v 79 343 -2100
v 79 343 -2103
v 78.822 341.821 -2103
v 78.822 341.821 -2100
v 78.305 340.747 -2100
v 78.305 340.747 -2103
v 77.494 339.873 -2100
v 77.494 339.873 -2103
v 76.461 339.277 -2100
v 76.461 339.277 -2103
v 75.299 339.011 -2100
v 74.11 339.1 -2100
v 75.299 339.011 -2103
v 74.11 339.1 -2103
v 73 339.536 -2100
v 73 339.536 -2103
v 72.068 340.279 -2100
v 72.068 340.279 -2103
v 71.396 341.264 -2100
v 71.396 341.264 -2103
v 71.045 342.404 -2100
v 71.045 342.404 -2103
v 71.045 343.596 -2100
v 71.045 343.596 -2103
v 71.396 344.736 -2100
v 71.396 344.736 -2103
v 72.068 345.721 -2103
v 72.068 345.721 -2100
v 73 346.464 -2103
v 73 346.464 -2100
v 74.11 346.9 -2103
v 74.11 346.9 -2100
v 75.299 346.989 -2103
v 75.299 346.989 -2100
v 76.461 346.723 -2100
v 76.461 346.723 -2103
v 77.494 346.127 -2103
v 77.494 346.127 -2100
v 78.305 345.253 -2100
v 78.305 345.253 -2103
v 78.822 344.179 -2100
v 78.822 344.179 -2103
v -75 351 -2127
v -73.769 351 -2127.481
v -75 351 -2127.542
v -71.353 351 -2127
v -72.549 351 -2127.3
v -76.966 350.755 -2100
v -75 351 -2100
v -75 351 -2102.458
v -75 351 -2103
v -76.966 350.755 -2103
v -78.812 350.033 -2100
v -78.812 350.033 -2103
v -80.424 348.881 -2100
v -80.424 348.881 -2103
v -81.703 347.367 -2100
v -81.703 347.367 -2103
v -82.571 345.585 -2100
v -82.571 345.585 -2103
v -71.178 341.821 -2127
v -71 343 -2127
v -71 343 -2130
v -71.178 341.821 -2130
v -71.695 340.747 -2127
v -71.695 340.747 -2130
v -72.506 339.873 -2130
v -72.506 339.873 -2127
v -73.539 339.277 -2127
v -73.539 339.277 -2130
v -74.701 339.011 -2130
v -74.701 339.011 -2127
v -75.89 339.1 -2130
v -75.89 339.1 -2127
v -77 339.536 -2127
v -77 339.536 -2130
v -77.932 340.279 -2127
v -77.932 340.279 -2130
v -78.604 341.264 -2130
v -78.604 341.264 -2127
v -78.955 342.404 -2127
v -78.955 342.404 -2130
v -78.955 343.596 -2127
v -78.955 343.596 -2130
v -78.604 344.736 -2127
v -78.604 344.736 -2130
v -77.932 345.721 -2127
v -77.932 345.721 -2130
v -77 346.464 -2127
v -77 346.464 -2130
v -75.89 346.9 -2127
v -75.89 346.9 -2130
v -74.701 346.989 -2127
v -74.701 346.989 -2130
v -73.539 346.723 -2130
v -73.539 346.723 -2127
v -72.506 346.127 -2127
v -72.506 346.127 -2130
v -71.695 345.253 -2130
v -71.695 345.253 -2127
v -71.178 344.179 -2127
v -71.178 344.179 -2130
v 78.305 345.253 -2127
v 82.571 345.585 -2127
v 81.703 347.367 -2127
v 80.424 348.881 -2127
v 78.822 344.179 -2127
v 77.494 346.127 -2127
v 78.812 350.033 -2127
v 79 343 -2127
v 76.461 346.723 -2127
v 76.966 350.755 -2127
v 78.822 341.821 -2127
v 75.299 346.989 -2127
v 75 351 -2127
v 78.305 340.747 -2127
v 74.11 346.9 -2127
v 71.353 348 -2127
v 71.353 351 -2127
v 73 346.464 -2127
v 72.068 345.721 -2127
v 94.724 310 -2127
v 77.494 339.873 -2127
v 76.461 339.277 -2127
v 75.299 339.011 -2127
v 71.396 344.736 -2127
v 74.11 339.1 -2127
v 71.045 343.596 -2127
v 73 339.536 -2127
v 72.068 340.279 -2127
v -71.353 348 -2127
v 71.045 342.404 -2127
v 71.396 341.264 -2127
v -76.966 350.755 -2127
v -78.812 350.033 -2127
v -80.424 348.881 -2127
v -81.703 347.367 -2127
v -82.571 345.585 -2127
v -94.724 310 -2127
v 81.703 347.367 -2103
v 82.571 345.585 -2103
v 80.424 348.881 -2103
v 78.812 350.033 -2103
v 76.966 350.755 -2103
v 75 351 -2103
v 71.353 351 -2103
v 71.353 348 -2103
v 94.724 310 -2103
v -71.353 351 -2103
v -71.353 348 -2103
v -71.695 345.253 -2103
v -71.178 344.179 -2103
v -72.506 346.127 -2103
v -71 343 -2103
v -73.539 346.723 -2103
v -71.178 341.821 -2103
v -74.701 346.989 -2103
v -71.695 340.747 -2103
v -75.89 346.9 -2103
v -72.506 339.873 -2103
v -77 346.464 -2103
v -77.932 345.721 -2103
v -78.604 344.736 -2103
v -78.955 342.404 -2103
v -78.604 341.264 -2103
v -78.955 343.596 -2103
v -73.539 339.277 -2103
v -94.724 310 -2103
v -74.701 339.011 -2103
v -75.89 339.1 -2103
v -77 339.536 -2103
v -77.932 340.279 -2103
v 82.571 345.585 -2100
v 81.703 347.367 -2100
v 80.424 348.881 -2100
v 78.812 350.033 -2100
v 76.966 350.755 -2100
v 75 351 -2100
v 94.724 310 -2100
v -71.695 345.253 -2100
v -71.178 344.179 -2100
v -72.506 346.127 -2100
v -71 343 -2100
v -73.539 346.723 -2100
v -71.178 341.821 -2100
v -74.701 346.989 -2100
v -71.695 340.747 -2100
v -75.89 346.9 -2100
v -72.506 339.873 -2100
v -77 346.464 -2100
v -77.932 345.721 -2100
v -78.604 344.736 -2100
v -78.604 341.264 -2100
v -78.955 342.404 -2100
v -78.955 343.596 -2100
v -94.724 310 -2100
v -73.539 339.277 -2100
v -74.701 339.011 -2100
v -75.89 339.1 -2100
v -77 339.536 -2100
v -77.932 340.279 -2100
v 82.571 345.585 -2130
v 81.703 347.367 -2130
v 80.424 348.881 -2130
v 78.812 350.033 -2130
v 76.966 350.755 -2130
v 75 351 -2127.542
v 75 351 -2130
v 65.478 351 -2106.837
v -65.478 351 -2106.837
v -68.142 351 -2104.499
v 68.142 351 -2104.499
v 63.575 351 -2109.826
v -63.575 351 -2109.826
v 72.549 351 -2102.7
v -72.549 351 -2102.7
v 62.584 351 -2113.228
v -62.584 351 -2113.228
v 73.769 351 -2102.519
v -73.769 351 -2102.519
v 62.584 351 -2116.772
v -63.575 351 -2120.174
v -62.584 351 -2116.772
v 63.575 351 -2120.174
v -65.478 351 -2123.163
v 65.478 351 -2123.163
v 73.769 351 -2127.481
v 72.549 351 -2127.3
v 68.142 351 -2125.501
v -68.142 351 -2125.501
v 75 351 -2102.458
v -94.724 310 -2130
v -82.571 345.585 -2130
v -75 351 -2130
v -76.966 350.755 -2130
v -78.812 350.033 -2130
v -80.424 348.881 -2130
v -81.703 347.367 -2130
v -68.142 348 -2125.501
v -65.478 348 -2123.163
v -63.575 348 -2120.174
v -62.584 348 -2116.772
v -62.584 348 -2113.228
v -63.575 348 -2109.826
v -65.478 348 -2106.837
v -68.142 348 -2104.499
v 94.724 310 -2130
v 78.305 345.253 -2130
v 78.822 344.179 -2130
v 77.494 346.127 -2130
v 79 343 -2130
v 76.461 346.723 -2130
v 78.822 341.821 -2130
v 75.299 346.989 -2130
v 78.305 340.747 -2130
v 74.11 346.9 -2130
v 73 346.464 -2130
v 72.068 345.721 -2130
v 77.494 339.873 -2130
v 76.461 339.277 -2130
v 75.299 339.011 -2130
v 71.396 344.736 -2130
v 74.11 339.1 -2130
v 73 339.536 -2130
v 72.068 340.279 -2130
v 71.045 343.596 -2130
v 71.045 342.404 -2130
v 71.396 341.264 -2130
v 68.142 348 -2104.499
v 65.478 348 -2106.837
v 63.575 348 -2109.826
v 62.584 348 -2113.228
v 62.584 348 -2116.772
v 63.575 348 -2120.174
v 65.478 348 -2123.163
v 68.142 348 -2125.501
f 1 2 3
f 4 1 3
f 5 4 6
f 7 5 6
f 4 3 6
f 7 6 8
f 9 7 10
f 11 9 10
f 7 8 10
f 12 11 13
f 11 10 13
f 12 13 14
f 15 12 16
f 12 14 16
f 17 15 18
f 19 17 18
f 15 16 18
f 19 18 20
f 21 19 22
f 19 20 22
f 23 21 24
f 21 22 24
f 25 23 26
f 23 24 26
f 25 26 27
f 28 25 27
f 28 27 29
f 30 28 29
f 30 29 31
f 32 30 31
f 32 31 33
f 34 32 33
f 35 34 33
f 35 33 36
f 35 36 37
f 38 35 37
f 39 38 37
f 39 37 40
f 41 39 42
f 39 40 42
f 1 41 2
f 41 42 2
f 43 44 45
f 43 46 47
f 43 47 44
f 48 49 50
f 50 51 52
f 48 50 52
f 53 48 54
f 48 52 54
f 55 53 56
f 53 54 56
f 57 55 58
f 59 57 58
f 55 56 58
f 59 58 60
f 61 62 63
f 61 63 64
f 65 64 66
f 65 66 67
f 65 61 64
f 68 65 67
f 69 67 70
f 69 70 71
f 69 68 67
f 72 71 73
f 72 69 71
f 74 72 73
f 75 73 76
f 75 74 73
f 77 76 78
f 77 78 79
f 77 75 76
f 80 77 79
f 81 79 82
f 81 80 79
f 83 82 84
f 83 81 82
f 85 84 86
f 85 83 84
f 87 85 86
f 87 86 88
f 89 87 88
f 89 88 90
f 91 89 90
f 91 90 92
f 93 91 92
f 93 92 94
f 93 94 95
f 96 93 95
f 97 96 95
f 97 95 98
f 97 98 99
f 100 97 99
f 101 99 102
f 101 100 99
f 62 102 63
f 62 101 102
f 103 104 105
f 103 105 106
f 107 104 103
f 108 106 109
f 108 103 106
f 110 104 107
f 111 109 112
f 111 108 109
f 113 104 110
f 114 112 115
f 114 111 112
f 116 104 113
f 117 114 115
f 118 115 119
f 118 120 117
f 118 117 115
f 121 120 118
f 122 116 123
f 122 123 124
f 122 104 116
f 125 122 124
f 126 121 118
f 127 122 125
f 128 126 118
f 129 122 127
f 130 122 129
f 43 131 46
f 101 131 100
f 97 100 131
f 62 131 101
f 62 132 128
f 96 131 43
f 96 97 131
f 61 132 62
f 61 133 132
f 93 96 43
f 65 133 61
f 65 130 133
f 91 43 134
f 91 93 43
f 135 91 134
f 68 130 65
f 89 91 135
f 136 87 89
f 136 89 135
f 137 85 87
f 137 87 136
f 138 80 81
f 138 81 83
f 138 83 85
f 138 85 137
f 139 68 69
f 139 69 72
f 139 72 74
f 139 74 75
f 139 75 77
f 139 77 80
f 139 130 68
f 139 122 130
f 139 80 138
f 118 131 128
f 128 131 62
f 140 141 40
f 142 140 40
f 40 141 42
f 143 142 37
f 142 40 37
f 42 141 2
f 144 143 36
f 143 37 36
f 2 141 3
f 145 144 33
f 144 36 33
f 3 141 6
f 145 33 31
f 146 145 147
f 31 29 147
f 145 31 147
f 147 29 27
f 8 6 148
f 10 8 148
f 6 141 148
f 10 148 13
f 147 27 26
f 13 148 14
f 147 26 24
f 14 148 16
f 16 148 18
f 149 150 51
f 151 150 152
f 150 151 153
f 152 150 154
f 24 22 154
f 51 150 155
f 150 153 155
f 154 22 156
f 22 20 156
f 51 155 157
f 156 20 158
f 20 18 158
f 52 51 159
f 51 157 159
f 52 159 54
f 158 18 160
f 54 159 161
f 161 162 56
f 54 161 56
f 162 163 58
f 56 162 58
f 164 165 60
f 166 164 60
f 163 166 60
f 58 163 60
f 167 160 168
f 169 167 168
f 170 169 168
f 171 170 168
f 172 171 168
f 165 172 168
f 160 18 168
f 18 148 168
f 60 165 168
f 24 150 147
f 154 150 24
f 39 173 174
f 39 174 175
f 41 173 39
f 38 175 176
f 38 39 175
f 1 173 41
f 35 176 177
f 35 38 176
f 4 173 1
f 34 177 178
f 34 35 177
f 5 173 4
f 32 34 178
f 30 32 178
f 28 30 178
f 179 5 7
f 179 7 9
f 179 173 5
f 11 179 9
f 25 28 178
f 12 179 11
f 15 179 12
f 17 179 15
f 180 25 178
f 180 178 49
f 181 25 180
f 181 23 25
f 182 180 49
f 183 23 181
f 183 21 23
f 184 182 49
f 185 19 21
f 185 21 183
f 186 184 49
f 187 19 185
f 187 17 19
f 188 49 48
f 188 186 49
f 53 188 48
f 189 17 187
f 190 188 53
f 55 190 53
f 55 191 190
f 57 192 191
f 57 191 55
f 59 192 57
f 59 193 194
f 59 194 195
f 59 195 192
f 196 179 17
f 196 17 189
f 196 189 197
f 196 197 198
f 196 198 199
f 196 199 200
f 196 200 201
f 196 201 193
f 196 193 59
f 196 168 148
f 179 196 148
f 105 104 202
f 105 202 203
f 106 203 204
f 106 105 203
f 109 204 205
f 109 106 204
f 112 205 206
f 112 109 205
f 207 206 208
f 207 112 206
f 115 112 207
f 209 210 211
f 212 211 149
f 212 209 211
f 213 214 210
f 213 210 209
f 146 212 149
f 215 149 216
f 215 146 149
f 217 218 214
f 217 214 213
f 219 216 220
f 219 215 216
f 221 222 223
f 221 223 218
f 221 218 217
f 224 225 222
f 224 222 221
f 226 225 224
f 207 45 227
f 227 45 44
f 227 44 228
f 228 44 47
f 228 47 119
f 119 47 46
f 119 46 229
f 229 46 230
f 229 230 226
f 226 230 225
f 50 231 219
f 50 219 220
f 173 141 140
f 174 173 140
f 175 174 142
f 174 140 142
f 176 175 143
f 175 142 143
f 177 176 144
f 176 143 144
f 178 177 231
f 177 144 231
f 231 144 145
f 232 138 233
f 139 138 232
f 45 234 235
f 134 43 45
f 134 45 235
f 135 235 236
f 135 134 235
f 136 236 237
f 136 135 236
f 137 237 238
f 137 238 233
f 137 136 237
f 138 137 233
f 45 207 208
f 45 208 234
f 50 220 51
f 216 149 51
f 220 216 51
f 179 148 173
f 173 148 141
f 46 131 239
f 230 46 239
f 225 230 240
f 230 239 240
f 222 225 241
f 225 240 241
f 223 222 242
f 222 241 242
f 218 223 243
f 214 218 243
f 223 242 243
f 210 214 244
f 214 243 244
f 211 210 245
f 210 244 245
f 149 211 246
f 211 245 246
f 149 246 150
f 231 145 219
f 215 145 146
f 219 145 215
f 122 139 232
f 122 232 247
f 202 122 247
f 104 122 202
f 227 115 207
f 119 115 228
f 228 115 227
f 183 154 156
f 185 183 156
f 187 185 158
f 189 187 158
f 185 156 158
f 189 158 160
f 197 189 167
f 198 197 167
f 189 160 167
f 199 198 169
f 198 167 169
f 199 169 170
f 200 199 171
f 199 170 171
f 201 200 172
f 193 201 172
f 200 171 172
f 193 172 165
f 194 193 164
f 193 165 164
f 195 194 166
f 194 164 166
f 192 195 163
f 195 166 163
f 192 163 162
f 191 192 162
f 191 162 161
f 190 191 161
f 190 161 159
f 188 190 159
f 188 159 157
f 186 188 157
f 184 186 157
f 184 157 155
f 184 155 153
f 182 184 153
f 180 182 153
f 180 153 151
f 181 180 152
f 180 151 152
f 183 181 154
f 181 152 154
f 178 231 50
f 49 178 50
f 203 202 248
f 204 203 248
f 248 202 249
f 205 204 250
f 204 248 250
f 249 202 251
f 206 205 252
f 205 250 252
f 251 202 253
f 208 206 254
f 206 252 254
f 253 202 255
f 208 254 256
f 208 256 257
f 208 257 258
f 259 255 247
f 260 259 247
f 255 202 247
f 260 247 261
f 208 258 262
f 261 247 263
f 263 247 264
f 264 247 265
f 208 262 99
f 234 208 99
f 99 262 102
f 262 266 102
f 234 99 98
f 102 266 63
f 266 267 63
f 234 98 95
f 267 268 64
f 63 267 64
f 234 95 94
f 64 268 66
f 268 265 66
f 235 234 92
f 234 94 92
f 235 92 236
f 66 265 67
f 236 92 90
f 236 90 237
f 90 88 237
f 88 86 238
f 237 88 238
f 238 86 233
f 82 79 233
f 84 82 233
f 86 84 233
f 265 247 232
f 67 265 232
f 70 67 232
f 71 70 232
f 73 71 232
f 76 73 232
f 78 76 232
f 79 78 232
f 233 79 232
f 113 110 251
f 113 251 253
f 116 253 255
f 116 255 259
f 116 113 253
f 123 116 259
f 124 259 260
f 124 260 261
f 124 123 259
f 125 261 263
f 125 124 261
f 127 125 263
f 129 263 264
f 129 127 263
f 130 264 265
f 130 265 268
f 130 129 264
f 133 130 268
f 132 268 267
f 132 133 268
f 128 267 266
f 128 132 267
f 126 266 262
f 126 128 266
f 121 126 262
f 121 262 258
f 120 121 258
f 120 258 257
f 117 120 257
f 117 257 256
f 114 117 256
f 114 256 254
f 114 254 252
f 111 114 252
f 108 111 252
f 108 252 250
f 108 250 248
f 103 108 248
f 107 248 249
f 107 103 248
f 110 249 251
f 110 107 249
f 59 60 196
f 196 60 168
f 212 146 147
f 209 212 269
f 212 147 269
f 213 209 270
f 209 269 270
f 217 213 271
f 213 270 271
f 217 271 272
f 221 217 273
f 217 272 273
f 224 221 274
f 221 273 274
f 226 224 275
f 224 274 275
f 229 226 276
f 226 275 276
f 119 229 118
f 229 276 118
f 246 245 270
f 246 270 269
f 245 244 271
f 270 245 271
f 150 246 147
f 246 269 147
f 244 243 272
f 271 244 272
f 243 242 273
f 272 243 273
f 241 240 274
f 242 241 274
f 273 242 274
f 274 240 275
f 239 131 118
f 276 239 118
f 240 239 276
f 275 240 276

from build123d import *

# Parameters (mm, degrees)
BOSS_EXTRUDE5_START = 348
BOSS_EXTRUDE5_DEPTH = 3
BOSS_EXTRUDE6_START = -12
F_3DSKETCH1_R       = 4
BOSS_EXTRUDE6_DEPTH = 3


# Read off the part's stored shape, not the designer's step: Boss-Extrude5
with BuildPart() as part:
    # Boss-Extrude5 outline → Boss-Extrude5 (new body)
    with BuildSketch(Plane(origin=(0, 0, 0), x_dir=(1, 0, 0), z_dir=(0, 1, 0)).offset(BOSS_EXTRUDE5_START)):
        with BuildLine():
            ThreePointArc((-75, 2127.541936718), (-62.458063282, 2115), (-75, 2102.458063282))
            Line((-75, 2102.458063282), (75, 2102.458063282))
            ThreePointArc((75, 2102.458063282), (62.458063282, 2115), (75, 2127.541936718))
            Line((75, 2127.541936718), (-75, 2127.541936718))
        make_face()
    extrude(amount=BOSS_EXTRUDE5_DEPTH)

    # 3DSketch1 → Boss-Extrude6 (add)
    with BuildSketch(Plane(origin=(-82.570684984, 345.585484263, -2115), x_dir=(0.9804457750026082, -0.19678943640230048, 0), z_dir=(0, 0, -1)).offset(BOSS_EXTRUDE6_START)):
        with BuildLine():
            Line((0, 0), (-4.912403262, 37.281198271))
            Line((-4.912403262, 37.281198271), (180.830256509, 0))
            Line((180.830256509, 0), (161.912158463, -32.498077123))
            ThreePointArc((161.912158463, -32.498077123), (158.280606568, -35.768969819), (153.423992856, -36.31688537))
            Line((153.423992856, -36.31688537), (6.357126606, -6.798469909))
            ThreePointArc((6.357126606, -6.798469909), (2.088099295, -4.418908183), (0, 0))
        make_face()
        with Locations(Location((7.931442097, 1.045096291, 0), (0, 0, 348.650723519))):
            Circle(F_3DSKETCH1_R, mode=Mode.SUBTRACT)
        with Locations(Location((154.998308348, -28.47331917, 0), (0, 0, 348.650723519))):
            Circle(F_3DSKETCH1_R, mode=Mode.SUBTRACT)
    extrude(amount=-BOSS_EXTRUDE6_DEPTH)

    # Mirror4: part across plane


with BuildPart() as part_1:
    add(part.part)
    add(part.part.mirror(Plane.XY.offset(-2115)))


solid = part_1.part
